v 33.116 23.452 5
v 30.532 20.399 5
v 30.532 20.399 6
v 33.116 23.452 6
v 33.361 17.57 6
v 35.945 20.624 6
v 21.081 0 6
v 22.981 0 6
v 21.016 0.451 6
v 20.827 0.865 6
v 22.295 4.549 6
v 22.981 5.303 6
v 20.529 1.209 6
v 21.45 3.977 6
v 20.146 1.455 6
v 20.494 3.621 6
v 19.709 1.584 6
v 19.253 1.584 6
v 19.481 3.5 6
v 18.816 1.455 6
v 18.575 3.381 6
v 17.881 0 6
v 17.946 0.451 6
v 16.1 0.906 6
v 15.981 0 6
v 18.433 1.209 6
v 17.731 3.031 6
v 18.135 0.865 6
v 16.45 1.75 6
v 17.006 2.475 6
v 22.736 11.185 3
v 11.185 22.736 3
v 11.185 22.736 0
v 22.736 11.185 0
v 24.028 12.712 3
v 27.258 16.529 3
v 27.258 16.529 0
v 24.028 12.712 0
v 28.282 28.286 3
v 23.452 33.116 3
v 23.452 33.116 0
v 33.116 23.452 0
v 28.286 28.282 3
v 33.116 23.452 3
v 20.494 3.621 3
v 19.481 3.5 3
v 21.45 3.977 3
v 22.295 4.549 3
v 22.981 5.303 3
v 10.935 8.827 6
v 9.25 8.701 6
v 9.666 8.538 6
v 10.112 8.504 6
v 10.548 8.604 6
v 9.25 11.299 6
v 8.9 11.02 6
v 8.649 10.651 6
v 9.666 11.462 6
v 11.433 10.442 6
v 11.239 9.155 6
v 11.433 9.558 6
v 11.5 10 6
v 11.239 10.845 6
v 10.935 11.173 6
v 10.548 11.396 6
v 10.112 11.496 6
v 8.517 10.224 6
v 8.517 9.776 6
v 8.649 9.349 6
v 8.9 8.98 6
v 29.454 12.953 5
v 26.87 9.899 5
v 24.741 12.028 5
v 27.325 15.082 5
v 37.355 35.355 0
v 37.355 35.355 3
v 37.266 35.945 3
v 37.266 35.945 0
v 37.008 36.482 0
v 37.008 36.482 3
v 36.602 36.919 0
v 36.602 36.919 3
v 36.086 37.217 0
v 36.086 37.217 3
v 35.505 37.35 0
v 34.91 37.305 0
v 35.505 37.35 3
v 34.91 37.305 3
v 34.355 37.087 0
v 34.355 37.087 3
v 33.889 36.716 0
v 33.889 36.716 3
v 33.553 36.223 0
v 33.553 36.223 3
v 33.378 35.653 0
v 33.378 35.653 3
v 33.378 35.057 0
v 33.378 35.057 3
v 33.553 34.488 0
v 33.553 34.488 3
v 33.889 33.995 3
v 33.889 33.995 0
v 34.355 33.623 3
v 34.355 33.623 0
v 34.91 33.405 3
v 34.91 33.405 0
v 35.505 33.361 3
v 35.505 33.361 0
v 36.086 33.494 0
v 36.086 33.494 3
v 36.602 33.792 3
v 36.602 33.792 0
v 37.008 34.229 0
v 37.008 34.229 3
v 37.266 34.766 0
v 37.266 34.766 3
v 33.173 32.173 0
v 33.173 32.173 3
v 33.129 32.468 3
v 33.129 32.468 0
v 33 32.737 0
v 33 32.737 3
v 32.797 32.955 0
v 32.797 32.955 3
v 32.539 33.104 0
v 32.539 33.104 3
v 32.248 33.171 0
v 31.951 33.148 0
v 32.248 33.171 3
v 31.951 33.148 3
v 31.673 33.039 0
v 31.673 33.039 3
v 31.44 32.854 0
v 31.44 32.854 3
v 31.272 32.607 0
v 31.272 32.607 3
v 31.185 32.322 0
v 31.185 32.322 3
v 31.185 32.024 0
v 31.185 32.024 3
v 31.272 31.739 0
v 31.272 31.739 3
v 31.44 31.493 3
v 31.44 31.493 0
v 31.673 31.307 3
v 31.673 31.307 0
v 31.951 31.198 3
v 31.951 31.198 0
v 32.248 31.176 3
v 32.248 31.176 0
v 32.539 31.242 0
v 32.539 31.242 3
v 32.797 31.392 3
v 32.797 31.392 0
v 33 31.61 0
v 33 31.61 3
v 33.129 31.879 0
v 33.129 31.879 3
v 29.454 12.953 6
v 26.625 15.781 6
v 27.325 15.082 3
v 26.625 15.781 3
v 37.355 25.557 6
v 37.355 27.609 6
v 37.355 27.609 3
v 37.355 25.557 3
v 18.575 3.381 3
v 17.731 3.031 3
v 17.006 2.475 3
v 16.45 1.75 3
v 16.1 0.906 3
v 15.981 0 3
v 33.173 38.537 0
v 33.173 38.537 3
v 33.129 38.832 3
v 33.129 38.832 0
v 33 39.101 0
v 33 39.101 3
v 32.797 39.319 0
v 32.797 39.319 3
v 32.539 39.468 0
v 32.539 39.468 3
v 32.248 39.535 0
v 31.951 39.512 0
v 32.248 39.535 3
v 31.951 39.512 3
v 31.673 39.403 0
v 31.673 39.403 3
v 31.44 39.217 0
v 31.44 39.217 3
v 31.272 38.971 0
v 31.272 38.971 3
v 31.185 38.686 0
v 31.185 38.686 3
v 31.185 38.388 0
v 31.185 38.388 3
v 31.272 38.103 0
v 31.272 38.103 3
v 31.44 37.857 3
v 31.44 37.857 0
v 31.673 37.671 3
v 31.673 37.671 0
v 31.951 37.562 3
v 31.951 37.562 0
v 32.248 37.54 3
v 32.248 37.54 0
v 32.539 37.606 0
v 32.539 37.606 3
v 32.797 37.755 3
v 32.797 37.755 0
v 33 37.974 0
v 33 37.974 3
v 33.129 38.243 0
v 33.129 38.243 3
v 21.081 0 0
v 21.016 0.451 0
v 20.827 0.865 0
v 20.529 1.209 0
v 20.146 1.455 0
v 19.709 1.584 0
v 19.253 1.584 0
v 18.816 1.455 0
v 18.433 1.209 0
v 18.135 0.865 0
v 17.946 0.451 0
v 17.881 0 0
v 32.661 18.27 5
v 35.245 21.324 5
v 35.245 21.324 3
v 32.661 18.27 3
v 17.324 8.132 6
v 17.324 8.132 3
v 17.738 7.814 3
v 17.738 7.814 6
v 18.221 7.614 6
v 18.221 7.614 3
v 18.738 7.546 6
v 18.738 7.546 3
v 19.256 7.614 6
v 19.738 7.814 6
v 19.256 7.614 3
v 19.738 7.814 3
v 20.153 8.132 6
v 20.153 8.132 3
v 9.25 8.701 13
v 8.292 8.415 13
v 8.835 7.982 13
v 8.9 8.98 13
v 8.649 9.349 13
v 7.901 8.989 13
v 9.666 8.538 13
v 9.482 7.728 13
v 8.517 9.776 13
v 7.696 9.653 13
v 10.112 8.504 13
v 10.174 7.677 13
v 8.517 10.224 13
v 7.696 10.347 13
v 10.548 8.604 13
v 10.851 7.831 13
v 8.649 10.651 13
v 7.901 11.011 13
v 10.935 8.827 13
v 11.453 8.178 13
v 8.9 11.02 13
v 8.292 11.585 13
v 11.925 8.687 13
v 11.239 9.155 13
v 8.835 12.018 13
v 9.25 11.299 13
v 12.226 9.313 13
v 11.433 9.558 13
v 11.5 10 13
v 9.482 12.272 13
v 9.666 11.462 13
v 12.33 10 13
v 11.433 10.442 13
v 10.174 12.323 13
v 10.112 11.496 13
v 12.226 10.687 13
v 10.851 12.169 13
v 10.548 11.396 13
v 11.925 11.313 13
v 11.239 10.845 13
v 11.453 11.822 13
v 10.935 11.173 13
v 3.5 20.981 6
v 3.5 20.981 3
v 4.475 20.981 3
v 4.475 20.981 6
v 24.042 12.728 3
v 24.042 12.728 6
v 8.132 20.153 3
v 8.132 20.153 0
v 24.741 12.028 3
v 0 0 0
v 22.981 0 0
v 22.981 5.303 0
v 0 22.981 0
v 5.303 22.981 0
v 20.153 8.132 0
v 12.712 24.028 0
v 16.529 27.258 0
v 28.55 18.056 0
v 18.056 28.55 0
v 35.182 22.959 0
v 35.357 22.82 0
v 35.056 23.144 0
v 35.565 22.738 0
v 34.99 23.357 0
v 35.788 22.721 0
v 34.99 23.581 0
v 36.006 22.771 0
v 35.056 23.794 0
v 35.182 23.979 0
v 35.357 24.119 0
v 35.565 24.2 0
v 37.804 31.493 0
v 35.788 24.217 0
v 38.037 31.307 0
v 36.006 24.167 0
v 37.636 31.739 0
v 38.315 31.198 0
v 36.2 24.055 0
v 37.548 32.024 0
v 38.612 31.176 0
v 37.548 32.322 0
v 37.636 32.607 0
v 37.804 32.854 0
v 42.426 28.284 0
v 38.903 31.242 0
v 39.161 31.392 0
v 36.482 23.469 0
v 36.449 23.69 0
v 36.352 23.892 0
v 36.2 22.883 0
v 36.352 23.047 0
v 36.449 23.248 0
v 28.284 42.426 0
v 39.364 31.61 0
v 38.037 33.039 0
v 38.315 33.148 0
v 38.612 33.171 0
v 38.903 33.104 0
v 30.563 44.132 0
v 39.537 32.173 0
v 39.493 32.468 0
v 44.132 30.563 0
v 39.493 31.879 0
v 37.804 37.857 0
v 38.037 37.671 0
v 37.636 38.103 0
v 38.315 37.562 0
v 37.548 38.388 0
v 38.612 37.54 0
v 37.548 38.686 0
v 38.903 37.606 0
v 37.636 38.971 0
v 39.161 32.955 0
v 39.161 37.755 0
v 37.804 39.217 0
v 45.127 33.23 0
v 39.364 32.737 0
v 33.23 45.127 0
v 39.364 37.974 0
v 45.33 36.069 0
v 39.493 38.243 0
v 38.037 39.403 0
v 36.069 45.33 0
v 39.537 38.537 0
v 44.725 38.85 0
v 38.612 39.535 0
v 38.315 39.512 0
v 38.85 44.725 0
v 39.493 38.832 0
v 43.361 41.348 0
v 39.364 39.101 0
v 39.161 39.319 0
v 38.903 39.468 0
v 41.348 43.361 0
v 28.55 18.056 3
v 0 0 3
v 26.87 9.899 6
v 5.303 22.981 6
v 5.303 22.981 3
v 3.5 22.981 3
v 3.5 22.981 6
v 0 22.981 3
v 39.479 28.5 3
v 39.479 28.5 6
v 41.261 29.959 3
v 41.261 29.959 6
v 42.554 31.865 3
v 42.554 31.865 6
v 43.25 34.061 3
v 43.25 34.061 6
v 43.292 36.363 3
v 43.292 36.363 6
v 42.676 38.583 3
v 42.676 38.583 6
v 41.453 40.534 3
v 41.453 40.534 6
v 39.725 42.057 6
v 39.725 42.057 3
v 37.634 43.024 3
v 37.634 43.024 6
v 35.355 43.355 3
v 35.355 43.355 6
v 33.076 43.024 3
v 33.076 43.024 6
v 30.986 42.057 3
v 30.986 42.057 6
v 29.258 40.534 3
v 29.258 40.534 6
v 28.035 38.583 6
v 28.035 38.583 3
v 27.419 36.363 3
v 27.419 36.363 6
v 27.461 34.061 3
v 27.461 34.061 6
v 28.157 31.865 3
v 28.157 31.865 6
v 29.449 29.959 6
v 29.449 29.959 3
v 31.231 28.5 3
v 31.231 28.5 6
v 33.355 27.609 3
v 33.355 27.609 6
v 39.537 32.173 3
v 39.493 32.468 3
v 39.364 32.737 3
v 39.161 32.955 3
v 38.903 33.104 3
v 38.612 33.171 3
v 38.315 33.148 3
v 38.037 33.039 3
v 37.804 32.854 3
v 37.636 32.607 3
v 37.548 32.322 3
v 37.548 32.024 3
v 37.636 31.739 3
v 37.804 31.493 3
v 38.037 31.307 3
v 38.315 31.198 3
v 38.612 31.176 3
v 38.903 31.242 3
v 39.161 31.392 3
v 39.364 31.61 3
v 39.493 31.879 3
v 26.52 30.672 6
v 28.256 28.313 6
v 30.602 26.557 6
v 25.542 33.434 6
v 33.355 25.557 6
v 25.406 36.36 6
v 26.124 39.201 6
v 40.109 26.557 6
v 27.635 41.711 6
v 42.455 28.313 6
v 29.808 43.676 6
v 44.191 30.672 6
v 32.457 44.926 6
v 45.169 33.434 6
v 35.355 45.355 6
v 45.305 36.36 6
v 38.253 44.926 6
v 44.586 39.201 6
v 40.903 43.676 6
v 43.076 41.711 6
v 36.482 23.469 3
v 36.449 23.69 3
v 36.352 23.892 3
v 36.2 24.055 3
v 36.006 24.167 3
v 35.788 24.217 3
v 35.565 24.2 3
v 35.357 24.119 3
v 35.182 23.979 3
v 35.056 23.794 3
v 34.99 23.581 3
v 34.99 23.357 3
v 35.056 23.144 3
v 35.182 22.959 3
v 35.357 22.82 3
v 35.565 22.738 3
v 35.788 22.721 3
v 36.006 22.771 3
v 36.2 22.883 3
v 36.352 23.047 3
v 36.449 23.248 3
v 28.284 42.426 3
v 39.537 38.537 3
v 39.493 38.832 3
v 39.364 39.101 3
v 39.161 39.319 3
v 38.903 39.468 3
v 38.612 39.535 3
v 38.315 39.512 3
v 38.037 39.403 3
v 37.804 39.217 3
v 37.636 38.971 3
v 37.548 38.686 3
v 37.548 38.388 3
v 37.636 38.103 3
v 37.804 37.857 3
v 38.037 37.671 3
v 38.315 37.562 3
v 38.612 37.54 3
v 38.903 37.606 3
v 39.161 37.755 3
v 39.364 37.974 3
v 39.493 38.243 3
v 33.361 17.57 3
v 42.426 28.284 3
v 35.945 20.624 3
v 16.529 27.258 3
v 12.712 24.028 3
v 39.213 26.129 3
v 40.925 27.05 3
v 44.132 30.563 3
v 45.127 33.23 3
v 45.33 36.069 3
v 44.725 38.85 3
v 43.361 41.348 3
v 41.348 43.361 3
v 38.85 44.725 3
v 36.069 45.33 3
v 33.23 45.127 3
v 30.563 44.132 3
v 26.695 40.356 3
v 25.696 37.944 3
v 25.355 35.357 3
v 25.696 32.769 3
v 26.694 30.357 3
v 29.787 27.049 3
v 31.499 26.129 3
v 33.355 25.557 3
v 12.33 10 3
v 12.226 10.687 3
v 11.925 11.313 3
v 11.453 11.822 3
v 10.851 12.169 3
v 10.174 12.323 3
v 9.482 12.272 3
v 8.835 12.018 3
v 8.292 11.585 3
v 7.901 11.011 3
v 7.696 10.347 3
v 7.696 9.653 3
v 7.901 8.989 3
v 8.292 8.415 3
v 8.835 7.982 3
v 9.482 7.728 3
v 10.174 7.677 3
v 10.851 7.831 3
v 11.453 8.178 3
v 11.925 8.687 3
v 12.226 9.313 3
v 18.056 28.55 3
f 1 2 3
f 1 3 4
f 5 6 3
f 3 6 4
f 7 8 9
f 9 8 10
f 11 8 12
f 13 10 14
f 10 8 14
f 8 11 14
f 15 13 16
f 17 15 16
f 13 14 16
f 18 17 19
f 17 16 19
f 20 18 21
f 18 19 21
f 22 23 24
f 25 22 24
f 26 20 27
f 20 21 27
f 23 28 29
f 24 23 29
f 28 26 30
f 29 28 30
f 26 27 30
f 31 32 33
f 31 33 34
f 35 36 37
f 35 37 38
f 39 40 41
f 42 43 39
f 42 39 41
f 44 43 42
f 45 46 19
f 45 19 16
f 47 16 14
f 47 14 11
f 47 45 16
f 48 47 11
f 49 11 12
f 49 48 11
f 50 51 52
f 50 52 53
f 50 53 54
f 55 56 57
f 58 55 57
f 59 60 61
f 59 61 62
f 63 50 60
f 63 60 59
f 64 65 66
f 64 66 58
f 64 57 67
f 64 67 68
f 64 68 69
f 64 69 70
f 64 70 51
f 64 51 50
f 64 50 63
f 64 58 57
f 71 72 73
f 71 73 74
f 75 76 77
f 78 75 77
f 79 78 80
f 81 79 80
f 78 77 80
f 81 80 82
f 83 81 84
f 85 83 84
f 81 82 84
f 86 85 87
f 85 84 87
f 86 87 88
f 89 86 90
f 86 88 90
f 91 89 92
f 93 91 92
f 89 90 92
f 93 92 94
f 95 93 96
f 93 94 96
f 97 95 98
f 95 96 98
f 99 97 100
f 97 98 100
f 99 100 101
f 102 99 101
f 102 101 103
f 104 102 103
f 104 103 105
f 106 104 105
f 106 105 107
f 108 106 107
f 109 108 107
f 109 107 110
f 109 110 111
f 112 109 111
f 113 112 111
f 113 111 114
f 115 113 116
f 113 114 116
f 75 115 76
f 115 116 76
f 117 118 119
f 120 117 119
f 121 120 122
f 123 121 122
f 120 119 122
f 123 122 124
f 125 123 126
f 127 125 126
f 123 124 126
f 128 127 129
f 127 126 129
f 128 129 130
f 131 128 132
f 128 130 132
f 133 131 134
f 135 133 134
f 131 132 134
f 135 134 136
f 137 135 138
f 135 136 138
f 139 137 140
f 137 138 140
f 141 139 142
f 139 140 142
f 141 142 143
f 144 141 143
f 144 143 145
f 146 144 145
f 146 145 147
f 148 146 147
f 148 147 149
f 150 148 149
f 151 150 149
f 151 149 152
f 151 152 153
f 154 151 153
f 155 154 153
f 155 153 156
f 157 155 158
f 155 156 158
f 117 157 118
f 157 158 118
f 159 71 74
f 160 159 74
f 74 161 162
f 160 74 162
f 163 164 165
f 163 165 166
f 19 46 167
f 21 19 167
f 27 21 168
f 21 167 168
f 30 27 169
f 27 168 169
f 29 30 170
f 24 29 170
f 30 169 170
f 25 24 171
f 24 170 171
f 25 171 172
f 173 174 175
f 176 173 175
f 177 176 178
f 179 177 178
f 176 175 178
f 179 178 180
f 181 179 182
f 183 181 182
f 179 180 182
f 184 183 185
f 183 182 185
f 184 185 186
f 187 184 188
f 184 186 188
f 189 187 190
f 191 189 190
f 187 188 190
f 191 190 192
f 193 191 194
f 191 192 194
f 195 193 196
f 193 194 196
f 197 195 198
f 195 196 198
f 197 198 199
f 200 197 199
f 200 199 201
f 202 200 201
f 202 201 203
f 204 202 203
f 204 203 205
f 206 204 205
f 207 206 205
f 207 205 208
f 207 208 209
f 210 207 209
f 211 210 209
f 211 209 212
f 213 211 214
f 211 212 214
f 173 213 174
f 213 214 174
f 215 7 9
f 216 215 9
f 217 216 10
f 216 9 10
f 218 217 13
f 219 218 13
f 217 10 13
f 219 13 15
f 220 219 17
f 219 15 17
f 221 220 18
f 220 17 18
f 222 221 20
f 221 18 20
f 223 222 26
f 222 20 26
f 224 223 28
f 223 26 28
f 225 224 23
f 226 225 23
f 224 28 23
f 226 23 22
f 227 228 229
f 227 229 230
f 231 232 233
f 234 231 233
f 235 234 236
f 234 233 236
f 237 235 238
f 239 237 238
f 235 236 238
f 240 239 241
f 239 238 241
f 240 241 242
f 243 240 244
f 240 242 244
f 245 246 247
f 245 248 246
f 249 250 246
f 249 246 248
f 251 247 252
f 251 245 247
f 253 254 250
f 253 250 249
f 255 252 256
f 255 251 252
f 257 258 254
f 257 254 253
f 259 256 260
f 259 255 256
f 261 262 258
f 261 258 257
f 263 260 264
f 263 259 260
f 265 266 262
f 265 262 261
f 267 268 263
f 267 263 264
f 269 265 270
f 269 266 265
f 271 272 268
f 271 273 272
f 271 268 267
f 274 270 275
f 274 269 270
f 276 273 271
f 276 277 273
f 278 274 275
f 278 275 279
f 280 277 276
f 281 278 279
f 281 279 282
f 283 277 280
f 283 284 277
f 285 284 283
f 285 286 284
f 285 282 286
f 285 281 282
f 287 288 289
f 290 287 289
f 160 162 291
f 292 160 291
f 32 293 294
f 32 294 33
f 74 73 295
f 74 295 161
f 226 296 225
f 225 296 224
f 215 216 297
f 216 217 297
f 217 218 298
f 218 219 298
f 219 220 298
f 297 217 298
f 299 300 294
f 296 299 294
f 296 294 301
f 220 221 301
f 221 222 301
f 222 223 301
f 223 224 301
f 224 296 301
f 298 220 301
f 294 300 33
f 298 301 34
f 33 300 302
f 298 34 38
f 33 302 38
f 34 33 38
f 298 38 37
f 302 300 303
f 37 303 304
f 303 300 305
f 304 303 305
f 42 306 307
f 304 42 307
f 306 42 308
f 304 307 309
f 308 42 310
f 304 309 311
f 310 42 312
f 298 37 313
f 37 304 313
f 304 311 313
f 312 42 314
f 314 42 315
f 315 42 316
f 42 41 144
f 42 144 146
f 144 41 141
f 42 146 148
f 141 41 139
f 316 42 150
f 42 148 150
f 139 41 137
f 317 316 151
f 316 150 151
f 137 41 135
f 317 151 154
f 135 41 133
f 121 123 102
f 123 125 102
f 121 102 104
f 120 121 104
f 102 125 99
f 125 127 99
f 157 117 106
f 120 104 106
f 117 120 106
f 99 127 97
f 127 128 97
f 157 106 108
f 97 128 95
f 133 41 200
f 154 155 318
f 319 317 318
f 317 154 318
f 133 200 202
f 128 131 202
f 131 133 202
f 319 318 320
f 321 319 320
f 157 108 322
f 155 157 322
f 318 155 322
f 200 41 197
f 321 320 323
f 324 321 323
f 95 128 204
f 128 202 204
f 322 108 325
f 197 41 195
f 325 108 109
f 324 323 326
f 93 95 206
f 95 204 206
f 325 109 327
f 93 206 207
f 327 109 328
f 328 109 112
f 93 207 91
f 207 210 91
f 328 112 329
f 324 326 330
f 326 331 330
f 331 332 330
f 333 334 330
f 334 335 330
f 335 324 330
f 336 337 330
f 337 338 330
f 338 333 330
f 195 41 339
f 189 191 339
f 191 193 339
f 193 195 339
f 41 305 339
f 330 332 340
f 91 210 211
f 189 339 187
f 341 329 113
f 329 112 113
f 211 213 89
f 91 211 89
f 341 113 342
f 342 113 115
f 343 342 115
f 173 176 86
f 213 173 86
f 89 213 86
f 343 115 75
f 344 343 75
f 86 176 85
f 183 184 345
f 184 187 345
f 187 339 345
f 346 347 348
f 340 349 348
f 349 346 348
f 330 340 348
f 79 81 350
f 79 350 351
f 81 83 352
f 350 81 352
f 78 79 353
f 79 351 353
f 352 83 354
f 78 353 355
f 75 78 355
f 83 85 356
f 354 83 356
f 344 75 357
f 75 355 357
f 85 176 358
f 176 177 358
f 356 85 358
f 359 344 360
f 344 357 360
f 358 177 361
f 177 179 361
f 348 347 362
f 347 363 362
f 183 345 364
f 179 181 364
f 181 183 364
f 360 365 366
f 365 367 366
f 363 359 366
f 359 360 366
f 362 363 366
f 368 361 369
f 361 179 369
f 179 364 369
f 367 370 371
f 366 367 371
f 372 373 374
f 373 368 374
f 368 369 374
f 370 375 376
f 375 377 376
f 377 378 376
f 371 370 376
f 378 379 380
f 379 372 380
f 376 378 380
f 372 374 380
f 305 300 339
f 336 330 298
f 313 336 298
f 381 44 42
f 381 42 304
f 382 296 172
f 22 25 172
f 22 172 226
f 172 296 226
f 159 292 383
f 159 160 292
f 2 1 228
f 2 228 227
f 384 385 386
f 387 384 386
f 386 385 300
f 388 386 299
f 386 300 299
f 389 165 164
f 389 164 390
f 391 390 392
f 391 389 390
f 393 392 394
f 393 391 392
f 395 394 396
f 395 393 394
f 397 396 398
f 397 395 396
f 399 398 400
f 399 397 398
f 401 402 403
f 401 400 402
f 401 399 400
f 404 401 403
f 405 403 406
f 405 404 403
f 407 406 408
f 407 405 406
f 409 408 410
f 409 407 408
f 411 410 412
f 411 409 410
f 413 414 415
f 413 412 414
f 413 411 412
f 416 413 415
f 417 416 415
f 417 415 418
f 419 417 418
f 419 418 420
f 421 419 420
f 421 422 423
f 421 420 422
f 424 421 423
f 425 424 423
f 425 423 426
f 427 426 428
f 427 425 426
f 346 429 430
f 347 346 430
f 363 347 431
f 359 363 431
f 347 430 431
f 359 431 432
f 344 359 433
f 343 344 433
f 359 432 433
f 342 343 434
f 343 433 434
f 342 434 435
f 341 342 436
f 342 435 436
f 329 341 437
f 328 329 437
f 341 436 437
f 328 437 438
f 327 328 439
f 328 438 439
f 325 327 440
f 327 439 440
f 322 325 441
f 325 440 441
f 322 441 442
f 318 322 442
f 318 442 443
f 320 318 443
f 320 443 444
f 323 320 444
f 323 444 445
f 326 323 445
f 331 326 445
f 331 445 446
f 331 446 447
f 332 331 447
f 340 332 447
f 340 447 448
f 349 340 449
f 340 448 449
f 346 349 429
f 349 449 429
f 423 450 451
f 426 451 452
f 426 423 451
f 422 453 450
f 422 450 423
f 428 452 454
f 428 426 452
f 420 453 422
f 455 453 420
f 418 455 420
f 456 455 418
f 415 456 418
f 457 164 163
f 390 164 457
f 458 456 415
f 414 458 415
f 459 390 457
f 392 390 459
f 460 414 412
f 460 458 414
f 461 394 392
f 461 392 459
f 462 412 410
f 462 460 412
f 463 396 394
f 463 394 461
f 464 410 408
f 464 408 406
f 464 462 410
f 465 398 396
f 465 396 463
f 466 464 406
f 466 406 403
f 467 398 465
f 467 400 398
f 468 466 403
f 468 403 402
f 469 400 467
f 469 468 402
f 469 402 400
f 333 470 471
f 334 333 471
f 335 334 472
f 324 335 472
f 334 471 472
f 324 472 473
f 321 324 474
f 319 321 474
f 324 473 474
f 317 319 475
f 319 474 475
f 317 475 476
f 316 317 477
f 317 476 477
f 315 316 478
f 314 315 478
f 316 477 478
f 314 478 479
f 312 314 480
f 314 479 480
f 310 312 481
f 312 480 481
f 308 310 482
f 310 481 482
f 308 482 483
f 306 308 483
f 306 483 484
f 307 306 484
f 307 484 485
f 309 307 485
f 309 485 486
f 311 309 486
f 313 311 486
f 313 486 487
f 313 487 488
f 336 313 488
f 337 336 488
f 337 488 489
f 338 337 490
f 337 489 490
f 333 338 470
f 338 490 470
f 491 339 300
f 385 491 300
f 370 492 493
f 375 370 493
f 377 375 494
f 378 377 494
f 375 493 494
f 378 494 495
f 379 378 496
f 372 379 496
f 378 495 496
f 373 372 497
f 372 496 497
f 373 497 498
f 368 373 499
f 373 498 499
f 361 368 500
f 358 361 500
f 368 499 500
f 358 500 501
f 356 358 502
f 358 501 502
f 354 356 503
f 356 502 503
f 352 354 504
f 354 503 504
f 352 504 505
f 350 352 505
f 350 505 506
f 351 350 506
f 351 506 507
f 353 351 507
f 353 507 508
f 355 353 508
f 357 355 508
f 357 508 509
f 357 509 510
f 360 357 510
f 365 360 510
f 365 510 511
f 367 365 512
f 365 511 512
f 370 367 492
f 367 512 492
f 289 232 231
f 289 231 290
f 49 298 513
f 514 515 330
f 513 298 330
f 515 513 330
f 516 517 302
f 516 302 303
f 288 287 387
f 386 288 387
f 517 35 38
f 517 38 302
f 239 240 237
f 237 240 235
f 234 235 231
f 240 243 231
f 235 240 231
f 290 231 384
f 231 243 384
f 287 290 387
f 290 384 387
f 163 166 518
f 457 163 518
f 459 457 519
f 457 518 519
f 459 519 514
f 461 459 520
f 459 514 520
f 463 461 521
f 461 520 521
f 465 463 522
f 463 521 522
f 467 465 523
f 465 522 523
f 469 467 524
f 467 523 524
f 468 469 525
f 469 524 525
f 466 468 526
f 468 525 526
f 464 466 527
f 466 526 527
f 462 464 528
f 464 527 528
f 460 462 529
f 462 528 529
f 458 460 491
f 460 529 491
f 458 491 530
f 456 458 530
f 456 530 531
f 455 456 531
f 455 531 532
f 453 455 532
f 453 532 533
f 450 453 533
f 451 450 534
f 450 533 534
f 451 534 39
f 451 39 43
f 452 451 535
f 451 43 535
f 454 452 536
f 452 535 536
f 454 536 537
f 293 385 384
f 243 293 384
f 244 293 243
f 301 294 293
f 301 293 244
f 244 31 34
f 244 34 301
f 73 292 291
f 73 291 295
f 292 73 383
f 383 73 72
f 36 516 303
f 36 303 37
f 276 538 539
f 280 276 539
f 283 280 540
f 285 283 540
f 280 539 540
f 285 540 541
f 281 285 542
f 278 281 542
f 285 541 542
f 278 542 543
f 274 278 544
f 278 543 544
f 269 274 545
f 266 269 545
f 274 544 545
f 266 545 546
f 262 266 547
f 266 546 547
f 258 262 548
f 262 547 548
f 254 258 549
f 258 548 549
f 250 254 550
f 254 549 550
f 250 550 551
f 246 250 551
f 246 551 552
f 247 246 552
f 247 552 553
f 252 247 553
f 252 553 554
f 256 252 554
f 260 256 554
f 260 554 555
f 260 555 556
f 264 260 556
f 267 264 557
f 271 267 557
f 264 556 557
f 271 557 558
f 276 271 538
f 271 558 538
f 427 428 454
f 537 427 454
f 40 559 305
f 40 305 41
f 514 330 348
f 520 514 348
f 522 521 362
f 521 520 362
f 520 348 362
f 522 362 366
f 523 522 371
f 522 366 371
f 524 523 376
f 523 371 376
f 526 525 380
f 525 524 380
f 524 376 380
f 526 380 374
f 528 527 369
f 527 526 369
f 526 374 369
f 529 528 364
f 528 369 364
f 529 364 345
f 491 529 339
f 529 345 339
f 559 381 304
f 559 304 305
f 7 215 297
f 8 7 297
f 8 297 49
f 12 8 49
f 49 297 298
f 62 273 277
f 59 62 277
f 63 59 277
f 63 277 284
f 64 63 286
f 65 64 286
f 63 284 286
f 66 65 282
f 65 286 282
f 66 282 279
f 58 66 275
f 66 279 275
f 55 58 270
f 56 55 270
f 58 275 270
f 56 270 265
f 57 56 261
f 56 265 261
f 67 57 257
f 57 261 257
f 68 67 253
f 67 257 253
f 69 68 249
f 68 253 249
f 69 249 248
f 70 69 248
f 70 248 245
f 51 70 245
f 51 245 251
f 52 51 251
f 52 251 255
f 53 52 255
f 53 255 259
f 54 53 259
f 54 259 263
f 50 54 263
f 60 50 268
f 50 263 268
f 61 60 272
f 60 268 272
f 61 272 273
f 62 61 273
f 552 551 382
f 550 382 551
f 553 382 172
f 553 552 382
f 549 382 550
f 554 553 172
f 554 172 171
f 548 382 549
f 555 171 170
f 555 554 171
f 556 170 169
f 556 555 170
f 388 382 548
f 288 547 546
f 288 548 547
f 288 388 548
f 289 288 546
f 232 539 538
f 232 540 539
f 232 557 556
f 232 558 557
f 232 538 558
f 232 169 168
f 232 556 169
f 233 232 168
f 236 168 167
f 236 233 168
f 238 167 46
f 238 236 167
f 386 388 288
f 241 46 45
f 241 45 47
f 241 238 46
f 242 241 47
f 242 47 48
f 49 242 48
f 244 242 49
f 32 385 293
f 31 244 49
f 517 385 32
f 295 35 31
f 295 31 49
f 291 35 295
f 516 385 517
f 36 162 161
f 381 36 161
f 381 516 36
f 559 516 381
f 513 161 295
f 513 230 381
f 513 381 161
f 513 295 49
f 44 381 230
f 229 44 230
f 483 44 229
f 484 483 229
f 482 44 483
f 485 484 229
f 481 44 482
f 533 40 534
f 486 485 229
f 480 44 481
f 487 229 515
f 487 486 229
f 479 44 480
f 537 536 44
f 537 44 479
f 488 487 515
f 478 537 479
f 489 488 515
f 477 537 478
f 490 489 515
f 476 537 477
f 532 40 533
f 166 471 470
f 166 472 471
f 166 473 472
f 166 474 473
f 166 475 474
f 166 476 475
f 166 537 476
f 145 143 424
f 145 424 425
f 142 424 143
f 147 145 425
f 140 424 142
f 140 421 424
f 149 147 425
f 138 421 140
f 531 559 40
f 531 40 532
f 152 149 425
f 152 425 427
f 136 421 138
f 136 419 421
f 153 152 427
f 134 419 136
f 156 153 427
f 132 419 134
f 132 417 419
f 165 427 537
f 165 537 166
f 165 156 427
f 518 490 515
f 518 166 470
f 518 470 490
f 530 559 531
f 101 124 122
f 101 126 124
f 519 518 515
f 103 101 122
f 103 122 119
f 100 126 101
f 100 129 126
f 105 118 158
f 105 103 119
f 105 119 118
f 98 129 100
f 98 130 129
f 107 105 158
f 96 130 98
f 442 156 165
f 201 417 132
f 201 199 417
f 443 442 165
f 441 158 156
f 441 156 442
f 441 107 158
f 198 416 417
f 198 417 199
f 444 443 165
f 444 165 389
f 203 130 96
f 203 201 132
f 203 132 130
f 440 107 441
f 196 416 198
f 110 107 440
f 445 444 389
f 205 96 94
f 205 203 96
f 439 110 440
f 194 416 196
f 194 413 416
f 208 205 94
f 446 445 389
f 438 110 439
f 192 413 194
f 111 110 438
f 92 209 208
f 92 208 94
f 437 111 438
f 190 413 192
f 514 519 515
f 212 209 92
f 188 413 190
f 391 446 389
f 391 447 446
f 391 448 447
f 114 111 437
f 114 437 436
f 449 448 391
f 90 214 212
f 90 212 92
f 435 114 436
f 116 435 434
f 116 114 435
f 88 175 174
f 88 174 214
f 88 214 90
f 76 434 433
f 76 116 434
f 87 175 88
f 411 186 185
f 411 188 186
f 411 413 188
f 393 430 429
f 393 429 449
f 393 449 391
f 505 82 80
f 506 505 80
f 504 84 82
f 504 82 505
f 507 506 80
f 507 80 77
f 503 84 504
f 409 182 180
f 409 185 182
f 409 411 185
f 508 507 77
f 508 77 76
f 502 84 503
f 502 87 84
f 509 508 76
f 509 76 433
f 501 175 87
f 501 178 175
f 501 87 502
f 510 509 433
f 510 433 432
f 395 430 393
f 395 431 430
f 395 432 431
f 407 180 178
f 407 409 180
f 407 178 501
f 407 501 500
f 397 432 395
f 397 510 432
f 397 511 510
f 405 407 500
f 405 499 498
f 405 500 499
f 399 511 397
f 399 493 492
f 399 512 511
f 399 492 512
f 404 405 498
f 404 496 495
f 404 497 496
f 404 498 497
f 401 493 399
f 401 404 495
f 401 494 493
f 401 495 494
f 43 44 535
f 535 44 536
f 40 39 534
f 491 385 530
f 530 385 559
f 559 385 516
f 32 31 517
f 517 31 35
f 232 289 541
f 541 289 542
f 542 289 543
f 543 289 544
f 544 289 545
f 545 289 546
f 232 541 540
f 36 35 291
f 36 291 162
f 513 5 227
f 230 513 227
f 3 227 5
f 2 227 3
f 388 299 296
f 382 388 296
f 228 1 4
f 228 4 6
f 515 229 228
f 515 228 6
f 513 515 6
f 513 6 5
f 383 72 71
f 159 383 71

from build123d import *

# Parameters (mm, degrees)
PAD_DEPTH       = 3
SKETCH002_R     = 2
SKETCH002_R_2   = 1
POCKET_DEPTH    = 3
POCKET001_DEPTH = 3
SKETCH005_R     = 2.33
PAD001_DEPTH    = 10
PAD002_DEPTH    = 3
SKETCH009_R     = 10
SKETCH009_R_2   = 8
PAD003_DEPTH    = 3
SKETCH011_R     = 0.75
POCKET002_DEPTH = 3
PAD004_DEPTH    = 3
SKETCH007_R     = 1.5
POCKET003_DEPTH = 7
POCKET004_DEPTH = 6
SKETCH014_W     = 3.5
SKETCH014_H     = 2
POCKET005_DEPTH = 3
POCKET006_DEPTH = 3
SKETCH013_W     = 6
SKETCH013_H     = 2
POCKET007_DEPTH = 3
SKETCH012_W     = 4.5
SKETCH012_H     = 2
POCKET008_DEPTH = 3


with BuildPart() as part:
    # Sketch001 → Pad (new body)
    with BuildSketch(Plane.XY):
        with BuildLine():
            Line((28.284271, 42.426407), (5.303301, 22.98097))
            Line((5.303301, 22.98097), (0, 22.98097))
            Line((0, 22.98097), (0, 0))
            Line((0, 0), (22.98097, 0))
            Line((22.98097, 0), (22.98097, 5.303301))
            Line((22.98097, 5.303301), (42.426407, 28.284271))
            ThreePointArc((42.426407, 28.284271), (42.426407, 42.426407), (28.284271, 42.426407))
        make_face()
    extrude(amount=PAD_DEPTH)

    # Sketch002 → Pocket (cut)
    with BuildSketch(Plane.XY.offset(3)):
        with Locations((35.355339, 35.355339)):
            Circle(SKETCH002_R)
        with Locations((38.53732, 38.53732)):
            Circle(SKETCH002_R_2)
        with Locations((32.173359, 38.53732)):
            Circle(SKETCH002_R_2)
        with Locations((32.173359, 32.173359)):
            Circle(SKETCH002_R_2)
        with Locations((38.53732, 32.173359)):
            Circle(SKETCH002_R_2)
    extrude(amount=-POCKET_DEPTH, mode=Mode.SUBTRACT)

    # Sketch003 → Pocket001 (cut)
    with BuildSketch(Plane.XY.offset(3)):
        Polygon((20.152543, 8.131728), (8.131728, 20.152543), (11.185273, 22.736312), (22.736312, 11.185273), align=None)
        Polygon((24.028197, 12.712046), (12.712046, 24.028197), (16.528977, 27.257908), (27.257908, 16.528977), align=None)
        Polygon((28.549792, 18.05575), (18.05575, 28.549792), (23.452375, 33.116168), (33.116168, 23.452375), align=None)
    extrude(amount=-POCKET001_DEPTH, mode=Mode.SUBTRACT)

    # Sketch005 → Pad001 (new body)
    with BuildSketch(Plane.XY.offset(3)):
        with Locations((10, 10)):
            Circle(SKETCH005_R)
    extrude(amount=PAD001_DEPTH)

    # Sketch004 → Pad002 (new body)
    with BuildSketch(Plane.XY.offset(3)):
        with BuildLine():
            Line((5.303301, 22.98097), (20.152543, 8.131728))
            ThreePointArc((17.324116, 8.131728), (18.73833, 7.545942), (20.152543, 8.131728))
            Line((17.324116, 8.131728), (4.474874, 20.98097))
            Line((0, 20.98097), (4.474874, 20.98097))
            Line((0, 22.98097), (0, 20.98097))
            Line((5.303301, 22.98097), (0, 22.98097))
        make_face()
        with BuildLine():
            Line((22.98097, 5.303301), (22.98097, 0))
            Line((22.98097, 0), (20.98097, 0))
            Line((20.98097, 0), (17.98097, 0))
            Line((17.98097, 0), (15.98097, 0))
            ThreePointArc((19.48097, 3.5), (17.006097, 2.474874), (15.98097, 0))
            ThreePointArc((19.48097, 3.5), (21.449594, 3.977326), (22.98097, 5.303301))
        make_face()
    extrude(amount=PAD002_DEPTH)

    # Sketch009 → Pad003 (new body)
    with BuildSketch(Plane.XY.offset(3)):
        with Locations((35.355339, 35.355339)):
            Circle(SKETCH009_R)
        with Locations((35.355339, 35.355339)):
            Circle(SKETCH009_R_2, mode=Mode.SUBTRACT)
    extrude(amount=PAD003_DEPTH)

    # Sketch011 → Pocket002 (cut)
    with BuildSketch(Plane.XY.offset(3)):
        with Locations((35.732096, 23.469065)):
            Circle(SKETCH011_R)
    extrude(amount=-POCKET002_DEPTH, mode=Mode.SUBTRACT)

    # Sketch006 → Pad004 (new body)
    with BuildSketch(Plane.XY.offset(3)):
        Polygon((35.944595, 20.623948), (33.360826, 17.570403), (30.532399, 20.39883), (33.116168, 23.452375), align=None)
        Polygon((24.041631, 12.727922), (26.870058, 9.899495), (29.453827, 12.95304), (26.6254, 15.781467), align=None)
    extrude(amount=PAD004_DEPTH)

    # Sketch007 → Pocket003 (cut)
    with BuildSketch(Plane.XY.offset(13)):
        with Locations((10, 10)):
            Circle(SKETCH007_R)
    extrude(amount=-POCKET003_DEPTH, mode=Mode.SUBTRACT)

    # Sketch008 → Pocket004 (cut)
    with BuildSketch(Plane.XY.offset(6)):
        with BuildLine():
            ThreePointArc((21.08097, 0), (19.48097, 1.6), (17.88097, 0))
            Line((21.08097, 0), (17.88097, 0))
        make_face()
    extrude(amount=-POCKET004_DEPTH, mode=Mode.SUBTRACT)

    # Sketch014 → Pocket005 (cut)
    with BuildSketch(Plane.XY.offset(6)):
        with Locations((1.75, 21.98097)):
            Rectangle(SKETCH014_W, SKETCH014_H)
    extrude(amount=-POCKET005_DEPTH, mode=Mode.SUBTRACT)

    # Sketch010 → Pocket006 (cut)
    with BuildSketch(Plane.XY.offset(6)):
        with BuildLine():
            ThreePointArc((33.355339, 27.609372), (35.355339, 27.355339), (37.355339, 27.609372))
            Line((37.355339, 27.609372), (37.355339, 25.55738))
            ThreePointArc((33.355339, 25.55738), (35.355339, 25.355339), (37.355339, 25.55738))
            Line((33.355339, 27.609372), (33.355339, 25.55738))
        make_face()
    extrude(amount=-POCKET006_DEPTH, mode=Mode.SUBTRACT)

    # Sketch013 → Pocket007 (cut)
    with BuildSketch(Plane(origin=(10.777283, -9.119239, 0), x_dir=(0.645942, 0.763386, 0), z_dir=(0.763386, -0.645942, 0))):
        with Locations((27, 4)):
            Rectangle(SKETCH013_W, SKETCH013_H)
    extrude(amount=-POCKET007_DEPTH, mode=Mode.SUBTRACT)

    # Sketch012 → Pocket008 (cut)
    with BuildSketch(Plane(origin=(7.734285, -6.544395, 0), x_dir=(-0.645942, -0.763386, 0), z_dir=(-0.763386, 0.645942, 0))):
        with Locations((-37.25, 4)):
            Rectangle(SKETCH012_W, SKETCH012_H)
    extrude(amount=-POCKET008_DEPTH, mode=Mode.SUBTRACT)


solid = part.part
